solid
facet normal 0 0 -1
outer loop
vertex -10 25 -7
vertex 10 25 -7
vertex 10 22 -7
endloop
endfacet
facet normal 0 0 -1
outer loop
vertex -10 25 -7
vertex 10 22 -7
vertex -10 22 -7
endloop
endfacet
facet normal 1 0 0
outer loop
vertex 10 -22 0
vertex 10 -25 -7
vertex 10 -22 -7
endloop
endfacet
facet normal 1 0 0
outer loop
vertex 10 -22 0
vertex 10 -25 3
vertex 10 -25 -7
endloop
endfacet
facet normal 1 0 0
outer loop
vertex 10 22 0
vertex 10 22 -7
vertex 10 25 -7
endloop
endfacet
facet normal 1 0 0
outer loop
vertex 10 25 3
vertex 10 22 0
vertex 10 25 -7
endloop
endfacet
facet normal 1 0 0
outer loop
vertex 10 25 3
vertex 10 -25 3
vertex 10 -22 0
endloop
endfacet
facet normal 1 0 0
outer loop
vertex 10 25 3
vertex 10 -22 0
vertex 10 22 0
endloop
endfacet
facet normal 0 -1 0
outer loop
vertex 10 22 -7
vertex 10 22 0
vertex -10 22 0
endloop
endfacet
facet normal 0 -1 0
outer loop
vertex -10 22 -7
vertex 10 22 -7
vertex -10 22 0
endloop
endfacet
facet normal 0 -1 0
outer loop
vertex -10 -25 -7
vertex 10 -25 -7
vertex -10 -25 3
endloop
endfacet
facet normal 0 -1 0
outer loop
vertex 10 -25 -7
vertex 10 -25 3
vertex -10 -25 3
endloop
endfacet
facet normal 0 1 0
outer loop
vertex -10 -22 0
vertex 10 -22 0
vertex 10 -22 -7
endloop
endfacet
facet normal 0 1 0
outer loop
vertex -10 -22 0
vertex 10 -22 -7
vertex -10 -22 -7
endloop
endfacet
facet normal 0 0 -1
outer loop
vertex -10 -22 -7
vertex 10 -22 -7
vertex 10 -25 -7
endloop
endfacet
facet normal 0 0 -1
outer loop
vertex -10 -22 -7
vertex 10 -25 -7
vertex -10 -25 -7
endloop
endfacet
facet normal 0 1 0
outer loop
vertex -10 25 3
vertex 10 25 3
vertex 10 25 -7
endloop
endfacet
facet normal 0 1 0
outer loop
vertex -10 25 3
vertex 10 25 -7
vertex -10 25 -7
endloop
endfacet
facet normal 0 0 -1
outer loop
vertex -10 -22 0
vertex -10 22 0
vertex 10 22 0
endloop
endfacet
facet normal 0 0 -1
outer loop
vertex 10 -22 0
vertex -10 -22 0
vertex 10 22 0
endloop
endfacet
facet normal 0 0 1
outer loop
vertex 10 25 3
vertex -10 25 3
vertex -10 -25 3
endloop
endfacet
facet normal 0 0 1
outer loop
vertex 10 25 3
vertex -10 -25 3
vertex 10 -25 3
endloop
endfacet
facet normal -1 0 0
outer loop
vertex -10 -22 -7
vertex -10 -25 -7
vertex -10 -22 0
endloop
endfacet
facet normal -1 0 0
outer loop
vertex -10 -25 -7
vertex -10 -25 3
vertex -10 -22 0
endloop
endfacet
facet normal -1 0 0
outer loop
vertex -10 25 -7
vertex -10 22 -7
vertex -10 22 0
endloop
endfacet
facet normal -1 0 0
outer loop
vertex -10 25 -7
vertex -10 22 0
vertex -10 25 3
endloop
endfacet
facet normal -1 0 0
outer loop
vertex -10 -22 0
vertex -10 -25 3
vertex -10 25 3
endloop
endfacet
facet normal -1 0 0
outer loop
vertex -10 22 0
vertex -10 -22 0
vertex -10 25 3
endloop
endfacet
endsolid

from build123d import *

# Parameters (mm, degrees)
CROQUIS1_W              = 20
CROQUIS1_H              = 50
SALIENTE_EXTRUIR1_DEPTH = 3
CROQUIS2_W              = 20
CROQUIS2_H              = 3
SALIENTE_EXTRUIR2_DEPTH = 7
CROQUIS3_W              = 20
CROQUIS3_H              = 3
SALIENTE_EXTRUIR3_DEPTH = 7


with BuildPart() as part:
    # Croquis1 → Saliente-Extruir1 (new body)
    with BuildSketch(Plane.XY):
        Rectangle(CROQUIS1_W, CROQUIS1_H)
    extrude(amount=SALIENTE_EXTRUIR1_DEPTH)

    # Croquis2 → Saliente-Extruir2 (add)
    with BuildSketch(Plane(origin=(0, 0, 0), x_dir=(-1, 0, 0), z_dir=(0, 0, -1))):
        with Locations((0, 23.5)):
            Rectangle(CROQUIS2_W, CROQUIS2_H)
    extrude(amount=SALIENTE_EXTRUIR2_DEPTH)

    # Croquis3 → Saliente-Extruir3 (add)
    with BuildSketch(Plane(origin=(0, 0, 0), x_dir=(-1, 0, 0), z_dir=(0, 0, -1))):
        with Locations((0, -23.5)):
            Rectangle(CROQUIS3_W, CROQUIS3_H)
    extrude(amount=SALIENTE_EXTRUIR3_DEPTH)


solid = part.part
